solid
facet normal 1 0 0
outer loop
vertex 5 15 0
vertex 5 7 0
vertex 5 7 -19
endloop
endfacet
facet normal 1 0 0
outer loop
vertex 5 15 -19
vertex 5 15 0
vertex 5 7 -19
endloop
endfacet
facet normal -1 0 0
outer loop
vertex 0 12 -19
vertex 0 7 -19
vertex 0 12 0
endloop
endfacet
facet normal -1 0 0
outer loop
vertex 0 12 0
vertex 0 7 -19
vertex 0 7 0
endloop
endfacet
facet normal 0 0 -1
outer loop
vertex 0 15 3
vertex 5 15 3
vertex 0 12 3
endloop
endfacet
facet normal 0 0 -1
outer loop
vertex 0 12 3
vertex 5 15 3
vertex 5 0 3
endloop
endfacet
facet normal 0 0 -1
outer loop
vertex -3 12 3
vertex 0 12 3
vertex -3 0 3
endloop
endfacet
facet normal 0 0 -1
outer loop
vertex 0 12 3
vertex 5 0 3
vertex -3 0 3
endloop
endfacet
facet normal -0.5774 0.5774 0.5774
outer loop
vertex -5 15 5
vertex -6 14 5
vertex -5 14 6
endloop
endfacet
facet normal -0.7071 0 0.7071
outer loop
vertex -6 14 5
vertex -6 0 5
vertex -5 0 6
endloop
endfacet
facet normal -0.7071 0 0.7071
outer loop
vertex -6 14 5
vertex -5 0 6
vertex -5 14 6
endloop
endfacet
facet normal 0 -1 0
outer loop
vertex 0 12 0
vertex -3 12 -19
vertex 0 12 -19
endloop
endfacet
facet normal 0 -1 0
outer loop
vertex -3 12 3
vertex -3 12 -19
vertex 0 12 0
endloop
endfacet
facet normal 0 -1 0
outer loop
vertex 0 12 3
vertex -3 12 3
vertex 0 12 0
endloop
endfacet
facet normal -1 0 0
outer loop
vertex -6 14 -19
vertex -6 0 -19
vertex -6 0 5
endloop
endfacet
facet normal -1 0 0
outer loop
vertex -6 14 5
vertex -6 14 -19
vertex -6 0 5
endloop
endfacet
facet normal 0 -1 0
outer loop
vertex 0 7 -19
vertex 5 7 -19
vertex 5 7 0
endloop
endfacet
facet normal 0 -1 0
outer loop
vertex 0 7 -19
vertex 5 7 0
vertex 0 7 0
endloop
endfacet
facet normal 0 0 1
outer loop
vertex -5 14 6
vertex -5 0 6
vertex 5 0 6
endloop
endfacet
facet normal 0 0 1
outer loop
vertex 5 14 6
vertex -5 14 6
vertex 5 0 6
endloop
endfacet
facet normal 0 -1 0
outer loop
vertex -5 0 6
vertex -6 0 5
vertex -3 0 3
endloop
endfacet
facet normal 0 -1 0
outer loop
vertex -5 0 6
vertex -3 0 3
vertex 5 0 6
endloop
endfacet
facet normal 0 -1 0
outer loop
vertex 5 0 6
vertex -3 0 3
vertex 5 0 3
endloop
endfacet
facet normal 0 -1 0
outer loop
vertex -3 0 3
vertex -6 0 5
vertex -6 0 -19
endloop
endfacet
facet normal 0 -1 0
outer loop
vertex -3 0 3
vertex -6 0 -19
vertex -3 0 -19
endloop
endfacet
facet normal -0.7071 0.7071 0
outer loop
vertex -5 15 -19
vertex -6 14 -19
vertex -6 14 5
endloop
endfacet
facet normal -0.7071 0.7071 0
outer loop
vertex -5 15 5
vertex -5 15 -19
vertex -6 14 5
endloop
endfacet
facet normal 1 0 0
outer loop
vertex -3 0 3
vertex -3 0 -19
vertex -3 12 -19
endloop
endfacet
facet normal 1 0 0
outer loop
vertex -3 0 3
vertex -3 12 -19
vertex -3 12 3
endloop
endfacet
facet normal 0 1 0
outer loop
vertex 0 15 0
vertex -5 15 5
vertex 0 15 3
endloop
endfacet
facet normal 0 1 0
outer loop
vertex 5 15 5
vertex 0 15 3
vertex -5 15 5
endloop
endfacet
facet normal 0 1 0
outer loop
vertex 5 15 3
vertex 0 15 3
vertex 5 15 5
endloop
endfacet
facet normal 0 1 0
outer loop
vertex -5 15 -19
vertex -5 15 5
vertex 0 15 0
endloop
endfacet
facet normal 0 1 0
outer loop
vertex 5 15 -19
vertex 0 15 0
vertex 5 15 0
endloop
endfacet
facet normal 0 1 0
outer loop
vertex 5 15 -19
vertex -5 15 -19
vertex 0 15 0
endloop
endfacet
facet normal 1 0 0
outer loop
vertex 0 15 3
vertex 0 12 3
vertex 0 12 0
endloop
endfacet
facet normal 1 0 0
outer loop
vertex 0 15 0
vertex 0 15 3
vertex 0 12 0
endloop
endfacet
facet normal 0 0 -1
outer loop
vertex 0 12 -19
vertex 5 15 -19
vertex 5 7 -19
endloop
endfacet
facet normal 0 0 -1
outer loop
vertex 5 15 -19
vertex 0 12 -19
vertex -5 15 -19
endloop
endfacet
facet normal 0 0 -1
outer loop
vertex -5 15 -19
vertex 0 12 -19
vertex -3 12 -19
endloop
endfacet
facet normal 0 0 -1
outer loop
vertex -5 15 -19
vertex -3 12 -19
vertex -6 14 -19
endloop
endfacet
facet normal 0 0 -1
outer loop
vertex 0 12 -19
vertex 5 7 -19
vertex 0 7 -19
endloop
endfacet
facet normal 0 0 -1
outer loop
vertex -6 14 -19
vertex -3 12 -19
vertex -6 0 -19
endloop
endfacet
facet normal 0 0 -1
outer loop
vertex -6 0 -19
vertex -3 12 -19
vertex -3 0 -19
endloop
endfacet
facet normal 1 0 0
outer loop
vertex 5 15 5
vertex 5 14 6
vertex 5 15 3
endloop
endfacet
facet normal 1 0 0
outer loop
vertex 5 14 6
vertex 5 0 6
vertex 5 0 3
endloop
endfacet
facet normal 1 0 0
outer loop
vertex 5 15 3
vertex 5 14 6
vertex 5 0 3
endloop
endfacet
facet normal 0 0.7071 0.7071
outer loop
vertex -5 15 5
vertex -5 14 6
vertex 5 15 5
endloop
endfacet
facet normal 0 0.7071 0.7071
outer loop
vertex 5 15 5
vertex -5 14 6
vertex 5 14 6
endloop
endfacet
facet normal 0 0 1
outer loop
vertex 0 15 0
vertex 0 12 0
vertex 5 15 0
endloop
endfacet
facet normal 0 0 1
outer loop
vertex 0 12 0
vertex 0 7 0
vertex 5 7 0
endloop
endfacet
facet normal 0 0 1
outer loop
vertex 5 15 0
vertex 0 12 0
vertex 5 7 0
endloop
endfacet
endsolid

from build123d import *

# Parameters (mm, degrees)
BOSS_EXTRUDE1_DEPTH = 15
SKETCH2_W           = 3
SKETCH2_H           = 41.822305452
CUT_EXTRUDE1_DEPTH  = 12
CHAMFER1_SIZE       = 1
SKETCH3_W           = 5.696125243
SKETCH3_H           = 11.031228464
CUT_EXTRUDE2_DEPTH  = 22


with BuildPart() as part:
    # Sketch1 → Boss-Extrude1 (new body)
    with BuildSketch(Plane(origin=(0, 0, 0), x_dir=(1, 0, 0), z_dir=(0, 1, 0))):
        Polygon((0, 0), (5, 0), (5, 19), (-6, 19), (-6, -6), (5, -6), (5, -3), (0, -3), align=None)
    extrude(amount=BOSS_EXTRUDE1_DEPTH)

    # Sketch2 → Cut-Extrude1 (cut)
    with BuildSketch(Plane.XZ):
        with Locations((-1.5, -17.911152726)):
            Rectangle(SKETCH2_W, SKETCH2_H)
    extrude(amount=-CUT_EXTRUDE1_DEPTH, mode=Mode.SUBTRACT)

    # Chamfer1
    chamfer1_edges = [part.edges().sort_by_distance(p)[0] for p in [
        (-6, 7.5, 6),
        (-6, 15, -6.5),
        (-0.5, 15, 6),
    ]]
    chamfer(chamfer1_edges, length=CHAMFER1_SIZE)

    # Sketch3 → Cut-Extrude2 (cut)
    with BuildSketch(Plane(origin=(0, 0, -19), x_dir=(-1, 0, 0), z_dir=(0, 0, -1))):
        with Locations((-2.848062622, 1.484385768)):
            Rectangle(SKETCH3_W, SKETCH3_H)
    extrude(amount=-CUT_EXTRUDE2_DEPTH, mode=Mode.SUBTRACT)


solid = part.part
